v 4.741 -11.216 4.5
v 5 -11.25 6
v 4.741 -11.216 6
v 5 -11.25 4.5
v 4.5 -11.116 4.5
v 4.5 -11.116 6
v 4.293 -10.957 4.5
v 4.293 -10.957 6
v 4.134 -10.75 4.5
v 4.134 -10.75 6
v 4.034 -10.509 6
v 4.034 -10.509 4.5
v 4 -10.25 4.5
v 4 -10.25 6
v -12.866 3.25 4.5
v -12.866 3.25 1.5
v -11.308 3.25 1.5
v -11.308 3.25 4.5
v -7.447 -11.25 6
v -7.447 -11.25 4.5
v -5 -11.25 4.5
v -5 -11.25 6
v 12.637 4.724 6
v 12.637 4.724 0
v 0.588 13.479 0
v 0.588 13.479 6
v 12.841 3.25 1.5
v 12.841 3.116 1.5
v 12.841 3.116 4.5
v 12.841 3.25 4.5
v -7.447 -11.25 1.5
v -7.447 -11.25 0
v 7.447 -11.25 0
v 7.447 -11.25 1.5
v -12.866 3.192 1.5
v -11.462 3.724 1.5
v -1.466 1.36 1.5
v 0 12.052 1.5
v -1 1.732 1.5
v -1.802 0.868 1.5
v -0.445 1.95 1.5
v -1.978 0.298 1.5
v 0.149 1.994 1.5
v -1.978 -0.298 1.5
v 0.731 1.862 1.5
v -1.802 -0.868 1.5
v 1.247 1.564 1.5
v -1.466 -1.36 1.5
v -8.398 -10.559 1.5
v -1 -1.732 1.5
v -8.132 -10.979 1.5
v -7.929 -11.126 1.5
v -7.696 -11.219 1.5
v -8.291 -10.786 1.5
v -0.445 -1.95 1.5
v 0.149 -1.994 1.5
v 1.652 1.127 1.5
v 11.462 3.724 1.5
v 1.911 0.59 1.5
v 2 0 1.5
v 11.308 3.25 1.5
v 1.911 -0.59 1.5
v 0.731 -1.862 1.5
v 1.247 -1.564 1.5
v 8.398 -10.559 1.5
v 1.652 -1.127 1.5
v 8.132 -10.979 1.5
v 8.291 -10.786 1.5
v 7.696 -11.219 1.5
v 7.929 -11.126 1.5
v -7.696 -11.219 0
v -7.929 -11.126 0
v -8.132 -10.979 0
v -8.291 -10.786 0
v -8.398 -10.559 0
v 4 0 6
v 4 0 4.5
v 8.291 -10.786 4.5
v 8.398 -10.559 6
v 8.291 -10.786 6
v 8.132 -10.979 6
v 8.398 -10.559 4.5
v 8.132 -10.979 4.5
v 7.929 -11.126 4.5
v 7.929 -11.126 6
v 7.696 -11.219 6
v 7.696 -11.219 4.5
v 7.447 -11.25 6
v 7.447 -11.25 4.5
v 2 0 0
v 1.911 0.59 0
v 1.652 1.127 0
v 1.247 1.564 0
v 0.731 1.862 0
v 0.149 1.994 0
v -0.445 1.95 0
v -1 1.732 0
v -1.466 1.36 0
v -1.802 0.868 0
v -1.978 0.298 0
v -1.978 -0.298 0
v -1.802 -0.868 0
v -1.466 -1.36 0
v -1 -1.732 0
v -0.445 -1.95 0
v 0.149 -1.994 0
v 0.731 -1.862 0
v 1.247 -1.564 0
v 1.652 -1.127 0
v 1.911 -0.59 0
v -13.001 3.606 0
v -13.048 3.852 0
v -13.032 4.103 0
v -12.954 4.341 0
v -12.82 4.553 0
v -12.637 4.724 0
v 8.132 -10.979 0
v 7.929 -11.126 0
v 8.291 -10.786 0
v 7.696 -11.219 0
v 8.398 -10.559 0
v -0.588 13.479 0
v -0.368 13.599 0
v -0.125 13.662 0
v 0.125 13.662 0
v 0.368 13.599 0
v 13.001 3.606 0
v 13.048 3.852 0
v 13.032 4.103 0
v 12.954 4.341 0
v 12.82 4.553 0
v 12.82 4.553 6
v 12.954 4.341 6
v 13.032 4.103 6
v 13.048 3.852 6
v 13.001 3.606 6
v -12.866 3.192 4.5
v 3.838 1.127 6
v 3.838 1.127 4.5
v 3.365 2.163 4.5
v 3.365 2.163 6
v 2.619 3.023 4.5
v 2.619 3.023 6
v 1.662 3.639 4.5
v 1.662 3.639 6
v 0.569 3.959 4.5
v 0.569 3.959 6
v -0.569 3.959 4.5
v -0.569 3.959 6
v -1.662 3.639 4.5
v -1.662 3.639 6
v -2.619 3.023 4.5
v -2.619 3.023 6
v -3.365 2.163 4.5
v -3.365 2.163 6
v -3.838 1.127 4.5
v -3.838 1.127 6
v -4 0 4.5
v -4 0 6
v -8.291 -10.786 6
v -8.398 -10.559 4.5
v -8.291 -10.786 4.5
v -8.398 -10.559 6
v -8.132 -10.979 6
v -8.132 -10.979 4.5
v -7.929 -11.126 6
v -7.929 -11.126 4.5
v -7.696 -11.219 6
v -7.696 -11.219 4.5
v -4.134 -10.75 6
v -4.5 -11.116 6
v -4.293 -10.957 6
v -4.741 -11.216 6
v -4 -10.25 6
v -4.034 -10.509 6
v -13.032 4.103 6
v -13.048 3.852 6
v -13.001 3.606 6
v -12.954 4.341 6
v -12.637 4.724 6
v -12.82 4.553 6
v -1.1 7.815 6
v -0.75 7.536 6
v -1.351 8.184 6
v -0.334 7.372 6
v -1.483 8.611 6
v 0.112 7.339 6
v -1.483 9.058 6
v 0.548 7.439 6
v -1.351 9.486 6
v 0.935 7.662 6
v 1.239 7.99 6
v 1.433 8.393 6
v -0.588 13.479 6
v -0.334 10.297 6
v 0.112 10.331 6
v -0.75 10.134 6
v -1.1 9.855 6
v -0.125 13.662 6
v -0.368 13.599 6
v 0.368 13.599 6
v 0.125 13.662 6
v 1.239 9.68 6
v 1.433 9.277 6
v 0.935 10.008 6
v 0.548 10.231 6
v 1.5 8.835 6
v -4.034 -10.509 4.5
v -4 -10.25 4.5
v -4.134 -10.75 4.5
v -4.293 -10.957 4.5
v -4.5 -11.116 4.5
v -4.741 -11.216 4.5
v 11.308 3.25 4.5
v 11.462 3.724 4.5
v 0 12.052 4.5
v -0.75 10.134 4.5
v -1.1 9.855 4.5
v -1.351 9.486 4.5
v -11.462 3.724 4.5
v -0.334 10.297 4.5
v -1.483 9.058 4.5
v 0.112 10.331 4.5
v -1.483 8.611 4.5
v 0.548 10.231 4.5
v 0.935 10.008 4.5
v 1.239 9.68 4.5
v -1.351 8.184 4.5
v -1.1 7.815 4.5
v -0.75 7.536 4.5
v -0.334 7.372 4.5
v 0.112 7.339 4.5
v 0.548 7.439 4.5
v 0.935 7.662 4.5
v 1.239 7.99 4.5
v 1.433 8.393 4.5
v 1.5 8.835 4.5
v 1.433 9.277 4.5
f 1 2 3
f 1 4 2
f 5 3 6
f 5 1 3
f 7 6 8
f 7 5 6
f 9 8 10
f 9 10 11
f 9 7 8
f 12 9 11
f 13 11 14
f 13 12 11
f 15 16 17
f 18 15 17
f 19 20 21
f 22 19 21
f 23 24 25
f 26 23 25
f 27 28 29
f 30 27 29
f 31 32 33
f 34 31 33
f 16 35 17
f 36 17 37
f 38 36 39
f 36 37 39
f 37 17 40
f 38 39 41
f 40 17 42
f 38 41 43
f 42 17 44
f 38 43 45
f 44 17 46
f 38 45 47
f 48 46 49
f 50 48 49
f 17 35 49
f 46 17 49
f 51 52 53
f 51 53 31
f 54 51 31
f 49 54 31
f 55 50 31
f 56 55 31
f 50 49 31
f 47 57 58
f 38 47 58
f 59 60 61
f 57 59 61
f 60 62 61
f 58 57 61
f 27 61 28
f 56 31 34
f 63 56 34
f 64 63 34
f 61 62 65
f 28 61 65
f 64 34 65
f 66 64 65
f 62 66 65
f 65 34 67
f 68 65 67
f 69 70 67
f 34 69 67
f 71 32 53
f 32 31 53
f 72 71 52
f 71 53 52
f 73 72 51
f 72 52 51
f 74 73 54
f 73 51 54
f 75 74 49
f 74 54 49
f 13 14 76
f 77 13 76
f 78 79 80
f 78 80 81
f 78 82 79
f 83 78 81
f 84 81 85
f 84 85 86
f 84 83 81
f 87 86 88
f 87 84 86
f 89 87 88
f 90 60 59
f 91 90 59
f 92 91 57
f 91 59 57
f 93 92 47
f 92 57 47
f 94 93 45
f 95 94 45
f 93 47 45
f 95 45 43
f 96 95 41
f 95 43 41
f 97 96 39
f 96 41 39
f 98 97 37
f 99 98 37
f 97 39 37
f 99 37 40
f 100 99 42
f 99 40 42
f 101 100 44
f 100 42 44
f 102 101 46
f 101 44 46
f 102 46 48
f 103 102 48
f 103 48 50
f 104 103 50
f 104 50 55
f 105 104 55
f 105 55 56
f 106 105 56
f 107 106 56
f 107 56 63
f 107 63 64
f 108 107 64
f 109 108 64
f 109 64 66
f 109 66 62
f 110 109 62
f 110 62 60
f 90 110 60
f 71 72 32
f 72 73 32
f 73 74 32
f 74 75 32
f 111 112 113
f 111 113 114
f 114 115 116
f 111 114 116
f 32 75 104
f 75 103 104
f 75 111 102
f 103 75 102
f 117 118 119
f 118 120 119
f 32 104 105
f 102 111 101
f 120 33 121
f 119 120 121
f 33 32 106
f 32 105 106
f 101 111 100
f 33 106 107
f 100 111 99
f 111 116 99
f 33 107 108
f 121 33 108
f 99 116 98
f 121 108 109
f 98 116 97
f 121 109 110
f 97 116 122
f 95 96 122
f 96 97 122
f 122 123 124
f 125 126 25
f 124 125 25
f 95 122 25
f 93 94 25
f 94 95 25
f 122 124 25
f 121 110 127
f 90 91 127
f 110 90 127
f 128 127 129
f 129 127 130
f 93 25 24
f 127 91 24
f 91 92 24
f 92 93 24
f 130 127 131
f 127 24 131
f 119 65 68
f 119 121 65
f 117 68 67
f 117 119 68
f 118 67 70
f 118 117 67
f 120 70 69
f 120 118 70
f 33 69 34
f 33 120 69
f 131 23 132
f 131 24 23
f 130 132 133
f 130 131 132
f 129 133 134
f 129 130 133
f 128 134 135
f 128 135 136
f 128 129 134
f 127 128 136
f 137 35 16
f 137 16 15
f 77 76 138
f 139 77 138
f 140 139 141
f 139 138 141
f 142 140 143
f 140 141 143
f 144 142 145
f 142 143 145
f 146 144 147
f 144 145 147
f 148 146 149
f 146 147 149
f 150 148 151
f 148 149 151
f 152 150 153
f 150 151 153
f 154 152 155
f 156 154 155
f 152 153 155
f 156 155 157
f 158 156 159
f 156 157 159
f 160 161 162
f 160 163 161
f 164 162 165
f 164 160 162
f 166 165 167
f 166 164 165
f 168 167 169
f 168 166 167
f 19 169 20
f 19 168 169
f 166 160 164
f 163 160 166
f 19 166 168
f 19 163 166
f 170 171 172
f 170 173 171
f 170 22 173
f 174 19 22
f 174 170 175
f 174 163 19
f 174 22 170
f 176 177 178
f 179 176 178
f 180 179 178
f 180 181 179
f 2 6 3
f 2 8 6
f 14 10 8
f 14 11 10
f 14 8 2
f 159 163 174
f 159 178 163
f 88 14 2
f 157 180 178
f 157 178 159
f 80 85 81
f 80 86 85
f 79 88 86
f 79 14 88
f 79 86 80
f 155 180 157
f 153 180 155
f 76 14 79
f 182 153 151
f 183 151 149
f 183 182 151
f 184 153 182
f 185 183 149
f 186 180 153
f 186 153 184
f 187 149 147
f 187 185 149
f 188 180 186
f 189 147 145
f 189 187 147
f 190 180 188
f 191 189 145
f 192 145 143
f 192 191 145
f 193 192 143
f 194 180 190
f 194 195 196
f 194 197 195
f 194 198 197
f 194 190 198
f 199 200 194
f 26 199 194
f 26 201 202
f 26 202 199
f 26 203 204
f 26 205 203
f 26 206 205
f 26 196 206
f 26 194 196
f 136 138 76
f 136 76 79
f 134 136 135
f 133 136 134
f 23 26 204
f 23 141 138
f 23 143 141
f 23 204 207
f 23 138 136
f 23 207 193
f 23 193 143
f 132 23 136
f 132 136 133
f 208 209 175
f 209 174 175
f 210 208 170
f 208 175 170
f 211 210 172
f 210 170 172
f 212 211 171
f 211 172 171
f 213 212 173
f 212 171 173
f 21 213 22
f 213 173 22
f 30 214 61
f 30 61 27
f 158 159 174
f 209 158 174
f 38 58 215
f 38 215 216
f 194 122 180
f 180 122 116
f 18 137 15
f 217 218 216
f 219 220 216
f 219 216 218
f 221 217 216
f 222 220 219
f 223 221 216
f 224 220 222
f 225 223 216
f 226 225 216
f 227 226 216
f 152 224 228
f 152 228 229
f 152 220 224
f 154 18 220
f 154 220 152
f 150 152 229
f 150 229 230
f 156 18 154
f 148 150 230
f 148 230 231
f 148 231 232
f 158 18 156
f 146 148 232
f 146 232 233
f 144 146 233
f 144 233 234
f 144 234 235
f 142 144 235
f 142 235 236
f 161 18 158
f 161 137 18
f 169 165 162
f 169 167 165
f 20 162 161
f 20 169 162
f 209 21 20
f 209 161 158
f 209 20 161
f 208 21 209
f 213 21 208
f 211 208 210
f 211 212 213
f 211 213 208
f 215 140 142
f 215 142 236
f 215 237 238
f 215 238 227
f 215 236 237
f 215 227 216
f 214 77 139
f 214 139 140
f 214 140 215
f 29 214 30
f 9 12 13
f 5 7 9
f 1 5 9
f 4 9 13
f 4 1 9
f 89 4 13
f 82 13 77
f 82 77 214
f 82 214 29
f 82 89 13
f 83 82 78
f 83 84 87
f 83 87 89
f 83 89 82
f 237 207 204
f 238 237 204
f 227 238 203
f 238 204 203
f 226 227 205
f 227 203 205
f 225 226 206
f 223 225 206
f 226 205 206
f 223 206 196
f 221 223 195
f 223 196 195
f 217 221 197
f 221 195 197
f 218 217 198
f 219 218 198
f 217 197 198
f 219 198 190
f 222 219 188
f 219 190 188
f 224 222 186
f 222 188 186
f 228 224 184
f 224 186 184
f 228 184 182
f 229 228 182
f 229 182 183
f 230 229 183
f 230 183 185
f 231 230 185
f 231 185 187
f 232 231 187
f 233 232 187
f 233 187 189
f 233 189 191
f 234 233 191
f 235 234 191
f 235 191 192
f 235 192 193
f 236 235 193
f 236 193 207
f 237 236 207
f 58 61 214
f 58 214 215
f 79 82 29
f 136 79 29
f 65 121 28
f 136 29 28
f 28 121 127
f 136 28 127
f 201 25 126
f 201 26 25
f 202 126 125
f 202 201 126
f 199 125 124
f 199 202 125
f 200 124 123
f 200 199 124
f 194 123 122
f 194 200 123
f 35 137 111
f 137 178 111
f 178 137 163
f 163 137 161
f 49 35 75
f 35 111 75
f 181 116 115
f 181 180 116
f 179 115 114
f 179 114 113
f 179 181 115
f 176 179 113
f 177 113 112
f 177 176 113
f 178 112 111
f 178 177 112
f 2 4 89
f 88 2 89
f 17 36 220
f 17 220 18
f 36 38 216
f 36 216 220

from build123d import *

# Parameters (mm, degrees)
F1_DEPTH  = 6
F2_T      = -1.5
F3_DEPTH  = 5
F4_T      = -1.5
F5_W      = 25.7072905079
F5_H      = 3
F6_DEPTH  = 14.5
F8_DEPTH  = 2
F9_R      = 2
F10_DEPTH = 25
F11_R     = 1
F12_R     = 1.5
F13_DEPTH = 2


with BuildPart() as f1:
    # F0 (on Top) → F1 (new body)
    with BuildSketch(Plane.XY):
        Polygon((8.1736034401, -11.25), (13.2251681766, 4.2971176266), (0, 13.9057647469), (-13.2251681766, 4.2971176266), (-8.1736034401, -11.25), align=None)
    extrude(amount=F1_DEPTH)

    # F2
    f2_openings = [f1.faces().sort_by_distance(p)[0] for p in [
        (10.699386, -3.476441, 3),
    ]]
    offset(amount=F2_T, openings=f2_openings)

    # F0 (on Top) → F3 (join)
    with BuildSketch(Plane.XY):
        Polygon((8.1736034401, -11.25), (13.2251681766, 4.2971176266), (0, 13.9057647469), (-13.2251681766, 4.2971176266), (-8.1736034401, -11.25), align=None)
    extrude(amount=F3_DEPTH)

    # F4
    f4_openings = [f1.faces().sort_by_distance(p)[0] for p in [
        (0, -11.25, 3),
    ]]
    offset(amount=F4_T, openings=f4_openings)

    # F5 (on face) → F6 (cut)
    with BuildSketch(Plane.XZ.offset(11.25)):
        with Locations((-0.012323726, 3)):
            Rectangle(F5_W, F5_H)
    extrude(amount=-F6_DEPTH, mode=Mode.SUBTRACT)

    # F7 (on face) → F8 (cut)
    with BuildSketch(Plane.XY.offset(6)):
        with BuildLine():
            Line((4, -12.5590292737), (4, 0))
            ThreePointArc((4, 0), (0, 4), (-4, 0))
            Line((-4, 0), (-4, -12.5590292737))
            Line((-4, -12.5590292737), (4, -12.5590292737))
        make_face()
    extrude(amount=-F8_DEPTH, mode=Mode.SUBTRACT)

    # F9 (on face) → F10 (cut)
    with BuildSketch(Plane.XY.offset(1.5)):
        Circle(F9_R)
    extrude(amount=-F10_DEPTH, mode=Mode.SUBTRACT)

    # F11
    f11_edges = [f1.edges().sort_by_distance(p)[0] for p in [
        (8.173603, -11.25, 5.25),
        (13.225168, 4.297118, 3),
        (8.173603, -11.25, 0.75),
        (-8.173603, -11.25, 0.75),
        (-8.173603, -11.25, 5.25),
        (-4, -11.25, 5.25),
        (4, -11.25, 5.25),
        (0, 13.905765, 3),
        (-13.225168, 4.297118, 3),
    ]]
    fillet(f11_edges, radius=F11_R)

    # F12 (on face) → F13 (cut)
    with BuildSketch(Plane.XY.offset(6)):
        with Locations((0, 8.8348483847)):
            Circle(F12_R)
    extrude(amount=-F13_DEPTH, mode=Mode.SUBTRACT)


solid = f1.part
